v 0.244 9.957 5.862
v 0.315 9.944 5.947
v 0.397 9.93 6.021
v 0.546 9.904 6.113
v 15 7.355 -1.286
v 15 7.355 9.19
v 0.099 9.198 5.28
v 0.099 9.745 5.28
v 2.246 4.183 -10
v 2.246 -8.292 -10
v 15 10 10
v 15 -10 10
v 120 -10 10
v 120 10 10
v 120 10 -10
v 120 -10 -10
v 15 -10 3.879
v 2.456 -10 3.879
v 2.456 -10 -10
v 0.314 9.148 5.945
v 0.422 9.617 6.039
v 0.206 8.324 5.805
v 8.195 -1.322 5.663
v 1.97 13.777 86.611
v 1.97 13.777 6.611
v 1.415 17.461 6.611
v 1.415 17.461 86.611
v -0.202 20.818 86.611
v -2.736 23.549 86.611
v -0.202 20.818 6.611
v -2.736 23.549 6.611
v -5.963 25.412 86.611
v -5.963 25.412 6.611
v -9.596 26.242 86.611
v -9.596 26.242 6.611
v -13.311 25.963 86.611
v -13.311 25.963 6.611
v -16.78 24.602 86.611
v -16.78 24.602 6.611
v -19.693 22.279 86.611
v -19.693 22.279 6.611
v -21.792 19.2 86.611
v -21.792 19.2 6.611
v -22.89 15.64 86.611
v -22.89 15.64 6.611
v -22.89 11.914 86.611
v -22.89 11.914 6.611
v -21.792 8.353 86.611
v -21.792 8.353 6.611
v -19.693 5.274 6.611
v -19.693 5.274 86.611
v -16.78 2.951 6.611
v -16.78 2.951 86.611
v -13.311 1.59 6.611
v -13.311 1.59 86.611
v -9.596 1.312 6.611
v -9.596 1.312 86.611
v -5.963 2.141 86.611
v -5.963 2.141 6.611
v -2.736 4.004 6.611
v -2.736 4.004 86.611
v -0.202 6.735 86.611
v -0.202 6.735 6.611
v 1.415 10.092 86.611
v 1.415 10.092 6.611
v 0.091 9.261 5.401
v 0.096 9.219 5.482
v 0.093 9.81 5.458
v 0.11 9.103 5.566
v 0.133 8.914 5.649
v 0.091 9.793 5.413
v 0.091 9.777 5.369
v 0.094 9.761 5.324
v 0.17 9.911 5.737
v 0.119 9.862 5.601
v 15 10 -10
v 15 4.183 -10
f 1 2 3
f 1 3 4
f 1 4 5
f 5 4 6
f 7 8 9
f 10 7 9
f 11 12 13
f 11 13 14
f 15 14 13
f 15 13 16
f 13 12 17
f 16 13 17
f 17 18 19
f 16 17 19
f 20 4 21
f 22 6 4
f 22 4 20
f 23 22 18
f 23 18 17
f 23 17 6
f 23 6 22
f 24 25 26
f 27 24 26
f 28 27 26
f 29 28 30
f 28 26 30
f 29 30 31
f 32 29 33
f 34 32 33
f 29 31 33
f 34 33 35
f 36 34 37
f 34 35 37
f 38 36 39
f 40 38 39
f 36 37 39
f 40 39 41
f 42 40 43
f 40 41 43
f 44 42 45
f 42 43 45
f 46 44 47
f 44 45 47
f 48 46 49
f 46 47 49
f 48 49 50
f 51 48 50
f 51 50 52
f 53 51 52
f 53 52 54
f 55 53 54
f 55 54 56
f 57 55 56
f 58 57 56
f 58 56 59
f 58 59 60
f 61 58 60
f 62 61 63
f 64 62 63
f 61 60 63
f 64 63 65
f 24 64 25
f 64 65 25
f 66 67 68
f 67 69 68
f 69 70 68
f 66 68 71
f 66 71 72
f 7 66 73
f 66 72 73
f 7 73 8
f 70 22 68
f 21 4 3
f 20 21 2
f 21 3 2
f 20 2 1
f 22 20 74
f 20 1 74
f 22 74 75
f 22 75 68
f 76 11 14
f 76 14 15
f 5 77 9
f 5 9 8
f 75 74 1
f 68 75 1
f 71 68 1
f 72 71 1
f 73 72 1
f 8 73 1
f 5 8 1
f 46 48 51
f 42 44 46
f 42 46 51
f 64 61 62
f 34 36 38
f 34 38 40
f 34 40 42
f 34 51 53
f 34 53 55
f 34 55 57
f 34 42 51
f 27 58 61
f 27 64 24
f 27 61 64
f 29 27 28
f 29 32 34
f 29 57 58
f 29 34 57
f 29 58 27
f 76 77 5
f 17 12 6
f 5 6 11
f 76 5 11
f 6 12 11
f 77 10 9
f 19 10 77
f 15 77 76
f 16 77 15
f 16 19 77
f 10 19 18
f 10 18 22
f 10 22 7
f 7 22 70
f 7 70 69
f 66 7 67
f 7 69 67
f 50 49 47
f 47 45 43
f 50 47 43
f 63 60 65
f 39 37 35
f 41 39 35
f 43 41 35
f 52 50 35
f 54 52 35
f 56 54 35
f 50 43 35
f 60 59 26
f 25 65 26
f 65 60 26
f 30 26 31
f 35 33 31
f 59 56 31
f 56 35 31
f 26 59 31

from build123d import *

# Parameters (mm, degrees)
SKETCH1_W           = 20
SKETCH1_H           = 20
BOSS_EXTRUDE1_DEPTH = 120
CUT_EXTRUDE1_DEPTH  = 120
CUT_EXTRUDE2_DEPTH  = 120
CUT_EXTRUDE7_DEPTH  = 15
CUT_EXTRUDE9_DEPTH  = 28
CUT_EXTRUDE10_DEPTH = 15
SKETCH6_12_W        = 4.019237886
SKETCH6_12_H        = 20
CUT_EXTRUDE12_DEPTH = 15
CUT_EXTRUDE14_DEPTH = 24
CUT_EXTRUDE15_DEPTH = 15
CUT_EXTRUDE13_DEPTH = 24
SKETCH14_R          = 12.5
BOSS_EXTRUDE2_DEPTH = 80


with BuildPart() as part:
    # Sketch1 → Boss-Extrude1 (new body)
    with BuildSketch(Plane(origin=(0, 0, 0), x_dir=(0, 0, -1), z_dir=(1, 0, 0))):
        Rectangle(SKETCH1_W, SKETCH1_H)
    extrude(amount=BOSS_EXTRUDE1_DEPTH)

    # Sketch4 → Cut-Extrude1 (cut)
    with BuildSketch(Plane(origin=(0, 10, 0), x_dir=(1, 0, 0), z_dir=(0, 1, 0))):
        Polygon((15, -10), (0, -5.980762114), (0, -10), align=None)
        Polygon((0, 10), (0, -5.980762114), (2.245949647, 10), align=None)
    extrude(amount=-CUT_EXTRUDE1_DEPTH, mode=Mode.SUBTRACT)

    # Sketch5 → Cut-Extrude2 (cut)
    with BuildSketch(Plane.XY.offset(10)):
        Polygon((15, 10), (0, 10), (15, 7.355095289), align=None)
        Polygon((2.455691218, -10), (0, 10), (0, -10), align=None)
    extrude(amount=-CUT_EXTRUDE2_DEPTH, mode=Mode.SUBTRACT)

    # Sketch6 → Cut-Extrude7 (cut)
    with BuildSketch(Plane(origin=(0, 0, 0), x_dir=(0, 0, -1), z_dir=(1, 0, 0))):
        Polygon((10, 10), (-5.980762114, 10), (10, 4.18347827), align=None)
    extrude(amount=CUT_EXTRUDE7_DEPTH, mode=Mode.SUBTRACT)

    # Sketch7 → Cut-Extrude9 (cut)
    with BuildSketch(Plane(origin=(0, 10, 0), x_dir=(1, 0, 0), z_dir=(0, 1, 0))):
        with BuildLine():
            Line((15, -10), (0.683663186, -6.163949112))
            ThreePointArc((0.683663186, -6.163949112), (0.223609764, -5.832758039), (0.098503967, -5.27986997))
            Line((0.098503967, -5.27986997), (2.245949647, 10))
            Line((2.245949647, 10), (-4.807920497, 10))
            Line((-4.807920497, 10), (-4.807920497, -10))
            Line((-4.807920497, -10), (15, -10))
        make_face()
    extrude(amount=-CUT_EXTRUDE9_DEPTH, mode=Mode.SUBTRACT)

    # Sketch6<9> → Cut-Extrude10 (cut)
    with BuildSketch(Plane(origin=(0, 0, 0), x_dir=(0, 0, -1), z_dir=(1, 0, 0))):
        Polygon((-5.980762114, 10), (-5.980762114, -10), (-3.878677408, -10), align=None)
    extrude(amount=CUT_EXTRUDE10_DEPTH, mode=Mode.SUBTRACT)

    # Sketch6<12> → Cut-Extrude12 (cut)
    with BuildSketch(Plane(origin=(0, 0, 0), x_dir=(0, 0, -1), z_dir=(1, 0, 0))):
        with Locations((-7.990381057, 0)):
            Rectangle(SKETCH6_12_W, SKETCH6_12_H)
    extrude(amount=CUT_EXTRUDE12_DEPTH, mode=Mode.SUBTRACT)

    # Sketch10 → Loft1 section 0
    with BuildSketch(Plane(origin=(0, 10, 0), x_dir=(1, 0, 0), z_dir=(0, 1, 0))):
        with BuildLine():
            Line((15, -10), (0, -5.980762114))
            Line((0, -5.980762114), (2.245949647, 10))
            Line((2.245949647, 10), (15, 10))
            Line((15, 10), (15, -10))
        make_face()
    # Sketch9 → Loft1 section 1
    with BuildSketch(Plane.XZ.offset(10)):
        with BuildLine():
            Line((2.455691218, -10), (2.455691218, 3.878677408))
            Line((2.455691218, 3.878677408), (15, 3.878677408))
            Line((15, 3.878677408), (15, -10))
            Line((15, -10), (2.455691218, -10))
        make_face()
    loft()

    # Sketch12 → Cut-Extrude14 (cut)
    with BuildSketch(Plane.XY.offset(10)):
        Polygon((15, 10), (0, 10), (15, 7.355095289), align=None)
        Polygon((2.455691218, -10), (0, 10), (0, -10), align=None)
    extrude(amount=-CUT_EXTRUDE14_DEPTH, mode=Mode.SUBTRACT)

    # Sketch13 → Cut-Extrude15 (cut)
    with BuildSketch(Plane(origin=(0, 0, 0), x_dir=(0, 0, -1), z_dir=(1, 0, 0))):
        Polygon((-5.980762114, 10), (10, 10), (10, 4.18347827), align=None)
    extrude(amount=CUT_EXTRUDE15_DEPTH, mode=Mode.SUBTRACT)

    # Sketch11 → Cut-Extrude13 (cut)
    with BuildSketch(Plane(origin=(0, 10, 0), x_dir=(1, 0, 0), z_dir=(0, 1, 0))):
        with BuildLine():
            Line((15, -10), (0.683663186, -6.163949112))
            ThreePointArc((0.683663186, -6.163949112), (0.223609764, -5.832758039), (0.098503967, -5.27986997))
            Line((0.098503967, -5.27986997), (2.248976463, 10.021536917))
            Line((2.248976463, 10.021536917), (0, 10.021536917))
            Line((0, 10.021536917), (0, -10))
            Line((0, -10), (15, -10))
        make_face()
    extrude(amount=-CUT_EXTRUDE13_DEPTH, mode=Mode.SUBTRACT)


with BuildPart() as body_2:
    # Sketch14 → Boss-Extrude2 (new body)
    with BuildSketch(Plane(origin=(1.880253322, 0, 10), x_dir=(1, 0, 0), z_dir=(0, 0, 1))):
        with Locations((-12.409980622, 13.776560467)):
            Circle(SKETCH14_R)
    extrude(amount=BOSS_EXTRUDE2_DEPTH)


with BuildPart() as body_2_1:
    # Body-Move/Copy1: moved
    add(body_2.part.moved(Location((0, 0, -3.389199925))))


solid = Compound([part.part, body_2_1.part])
